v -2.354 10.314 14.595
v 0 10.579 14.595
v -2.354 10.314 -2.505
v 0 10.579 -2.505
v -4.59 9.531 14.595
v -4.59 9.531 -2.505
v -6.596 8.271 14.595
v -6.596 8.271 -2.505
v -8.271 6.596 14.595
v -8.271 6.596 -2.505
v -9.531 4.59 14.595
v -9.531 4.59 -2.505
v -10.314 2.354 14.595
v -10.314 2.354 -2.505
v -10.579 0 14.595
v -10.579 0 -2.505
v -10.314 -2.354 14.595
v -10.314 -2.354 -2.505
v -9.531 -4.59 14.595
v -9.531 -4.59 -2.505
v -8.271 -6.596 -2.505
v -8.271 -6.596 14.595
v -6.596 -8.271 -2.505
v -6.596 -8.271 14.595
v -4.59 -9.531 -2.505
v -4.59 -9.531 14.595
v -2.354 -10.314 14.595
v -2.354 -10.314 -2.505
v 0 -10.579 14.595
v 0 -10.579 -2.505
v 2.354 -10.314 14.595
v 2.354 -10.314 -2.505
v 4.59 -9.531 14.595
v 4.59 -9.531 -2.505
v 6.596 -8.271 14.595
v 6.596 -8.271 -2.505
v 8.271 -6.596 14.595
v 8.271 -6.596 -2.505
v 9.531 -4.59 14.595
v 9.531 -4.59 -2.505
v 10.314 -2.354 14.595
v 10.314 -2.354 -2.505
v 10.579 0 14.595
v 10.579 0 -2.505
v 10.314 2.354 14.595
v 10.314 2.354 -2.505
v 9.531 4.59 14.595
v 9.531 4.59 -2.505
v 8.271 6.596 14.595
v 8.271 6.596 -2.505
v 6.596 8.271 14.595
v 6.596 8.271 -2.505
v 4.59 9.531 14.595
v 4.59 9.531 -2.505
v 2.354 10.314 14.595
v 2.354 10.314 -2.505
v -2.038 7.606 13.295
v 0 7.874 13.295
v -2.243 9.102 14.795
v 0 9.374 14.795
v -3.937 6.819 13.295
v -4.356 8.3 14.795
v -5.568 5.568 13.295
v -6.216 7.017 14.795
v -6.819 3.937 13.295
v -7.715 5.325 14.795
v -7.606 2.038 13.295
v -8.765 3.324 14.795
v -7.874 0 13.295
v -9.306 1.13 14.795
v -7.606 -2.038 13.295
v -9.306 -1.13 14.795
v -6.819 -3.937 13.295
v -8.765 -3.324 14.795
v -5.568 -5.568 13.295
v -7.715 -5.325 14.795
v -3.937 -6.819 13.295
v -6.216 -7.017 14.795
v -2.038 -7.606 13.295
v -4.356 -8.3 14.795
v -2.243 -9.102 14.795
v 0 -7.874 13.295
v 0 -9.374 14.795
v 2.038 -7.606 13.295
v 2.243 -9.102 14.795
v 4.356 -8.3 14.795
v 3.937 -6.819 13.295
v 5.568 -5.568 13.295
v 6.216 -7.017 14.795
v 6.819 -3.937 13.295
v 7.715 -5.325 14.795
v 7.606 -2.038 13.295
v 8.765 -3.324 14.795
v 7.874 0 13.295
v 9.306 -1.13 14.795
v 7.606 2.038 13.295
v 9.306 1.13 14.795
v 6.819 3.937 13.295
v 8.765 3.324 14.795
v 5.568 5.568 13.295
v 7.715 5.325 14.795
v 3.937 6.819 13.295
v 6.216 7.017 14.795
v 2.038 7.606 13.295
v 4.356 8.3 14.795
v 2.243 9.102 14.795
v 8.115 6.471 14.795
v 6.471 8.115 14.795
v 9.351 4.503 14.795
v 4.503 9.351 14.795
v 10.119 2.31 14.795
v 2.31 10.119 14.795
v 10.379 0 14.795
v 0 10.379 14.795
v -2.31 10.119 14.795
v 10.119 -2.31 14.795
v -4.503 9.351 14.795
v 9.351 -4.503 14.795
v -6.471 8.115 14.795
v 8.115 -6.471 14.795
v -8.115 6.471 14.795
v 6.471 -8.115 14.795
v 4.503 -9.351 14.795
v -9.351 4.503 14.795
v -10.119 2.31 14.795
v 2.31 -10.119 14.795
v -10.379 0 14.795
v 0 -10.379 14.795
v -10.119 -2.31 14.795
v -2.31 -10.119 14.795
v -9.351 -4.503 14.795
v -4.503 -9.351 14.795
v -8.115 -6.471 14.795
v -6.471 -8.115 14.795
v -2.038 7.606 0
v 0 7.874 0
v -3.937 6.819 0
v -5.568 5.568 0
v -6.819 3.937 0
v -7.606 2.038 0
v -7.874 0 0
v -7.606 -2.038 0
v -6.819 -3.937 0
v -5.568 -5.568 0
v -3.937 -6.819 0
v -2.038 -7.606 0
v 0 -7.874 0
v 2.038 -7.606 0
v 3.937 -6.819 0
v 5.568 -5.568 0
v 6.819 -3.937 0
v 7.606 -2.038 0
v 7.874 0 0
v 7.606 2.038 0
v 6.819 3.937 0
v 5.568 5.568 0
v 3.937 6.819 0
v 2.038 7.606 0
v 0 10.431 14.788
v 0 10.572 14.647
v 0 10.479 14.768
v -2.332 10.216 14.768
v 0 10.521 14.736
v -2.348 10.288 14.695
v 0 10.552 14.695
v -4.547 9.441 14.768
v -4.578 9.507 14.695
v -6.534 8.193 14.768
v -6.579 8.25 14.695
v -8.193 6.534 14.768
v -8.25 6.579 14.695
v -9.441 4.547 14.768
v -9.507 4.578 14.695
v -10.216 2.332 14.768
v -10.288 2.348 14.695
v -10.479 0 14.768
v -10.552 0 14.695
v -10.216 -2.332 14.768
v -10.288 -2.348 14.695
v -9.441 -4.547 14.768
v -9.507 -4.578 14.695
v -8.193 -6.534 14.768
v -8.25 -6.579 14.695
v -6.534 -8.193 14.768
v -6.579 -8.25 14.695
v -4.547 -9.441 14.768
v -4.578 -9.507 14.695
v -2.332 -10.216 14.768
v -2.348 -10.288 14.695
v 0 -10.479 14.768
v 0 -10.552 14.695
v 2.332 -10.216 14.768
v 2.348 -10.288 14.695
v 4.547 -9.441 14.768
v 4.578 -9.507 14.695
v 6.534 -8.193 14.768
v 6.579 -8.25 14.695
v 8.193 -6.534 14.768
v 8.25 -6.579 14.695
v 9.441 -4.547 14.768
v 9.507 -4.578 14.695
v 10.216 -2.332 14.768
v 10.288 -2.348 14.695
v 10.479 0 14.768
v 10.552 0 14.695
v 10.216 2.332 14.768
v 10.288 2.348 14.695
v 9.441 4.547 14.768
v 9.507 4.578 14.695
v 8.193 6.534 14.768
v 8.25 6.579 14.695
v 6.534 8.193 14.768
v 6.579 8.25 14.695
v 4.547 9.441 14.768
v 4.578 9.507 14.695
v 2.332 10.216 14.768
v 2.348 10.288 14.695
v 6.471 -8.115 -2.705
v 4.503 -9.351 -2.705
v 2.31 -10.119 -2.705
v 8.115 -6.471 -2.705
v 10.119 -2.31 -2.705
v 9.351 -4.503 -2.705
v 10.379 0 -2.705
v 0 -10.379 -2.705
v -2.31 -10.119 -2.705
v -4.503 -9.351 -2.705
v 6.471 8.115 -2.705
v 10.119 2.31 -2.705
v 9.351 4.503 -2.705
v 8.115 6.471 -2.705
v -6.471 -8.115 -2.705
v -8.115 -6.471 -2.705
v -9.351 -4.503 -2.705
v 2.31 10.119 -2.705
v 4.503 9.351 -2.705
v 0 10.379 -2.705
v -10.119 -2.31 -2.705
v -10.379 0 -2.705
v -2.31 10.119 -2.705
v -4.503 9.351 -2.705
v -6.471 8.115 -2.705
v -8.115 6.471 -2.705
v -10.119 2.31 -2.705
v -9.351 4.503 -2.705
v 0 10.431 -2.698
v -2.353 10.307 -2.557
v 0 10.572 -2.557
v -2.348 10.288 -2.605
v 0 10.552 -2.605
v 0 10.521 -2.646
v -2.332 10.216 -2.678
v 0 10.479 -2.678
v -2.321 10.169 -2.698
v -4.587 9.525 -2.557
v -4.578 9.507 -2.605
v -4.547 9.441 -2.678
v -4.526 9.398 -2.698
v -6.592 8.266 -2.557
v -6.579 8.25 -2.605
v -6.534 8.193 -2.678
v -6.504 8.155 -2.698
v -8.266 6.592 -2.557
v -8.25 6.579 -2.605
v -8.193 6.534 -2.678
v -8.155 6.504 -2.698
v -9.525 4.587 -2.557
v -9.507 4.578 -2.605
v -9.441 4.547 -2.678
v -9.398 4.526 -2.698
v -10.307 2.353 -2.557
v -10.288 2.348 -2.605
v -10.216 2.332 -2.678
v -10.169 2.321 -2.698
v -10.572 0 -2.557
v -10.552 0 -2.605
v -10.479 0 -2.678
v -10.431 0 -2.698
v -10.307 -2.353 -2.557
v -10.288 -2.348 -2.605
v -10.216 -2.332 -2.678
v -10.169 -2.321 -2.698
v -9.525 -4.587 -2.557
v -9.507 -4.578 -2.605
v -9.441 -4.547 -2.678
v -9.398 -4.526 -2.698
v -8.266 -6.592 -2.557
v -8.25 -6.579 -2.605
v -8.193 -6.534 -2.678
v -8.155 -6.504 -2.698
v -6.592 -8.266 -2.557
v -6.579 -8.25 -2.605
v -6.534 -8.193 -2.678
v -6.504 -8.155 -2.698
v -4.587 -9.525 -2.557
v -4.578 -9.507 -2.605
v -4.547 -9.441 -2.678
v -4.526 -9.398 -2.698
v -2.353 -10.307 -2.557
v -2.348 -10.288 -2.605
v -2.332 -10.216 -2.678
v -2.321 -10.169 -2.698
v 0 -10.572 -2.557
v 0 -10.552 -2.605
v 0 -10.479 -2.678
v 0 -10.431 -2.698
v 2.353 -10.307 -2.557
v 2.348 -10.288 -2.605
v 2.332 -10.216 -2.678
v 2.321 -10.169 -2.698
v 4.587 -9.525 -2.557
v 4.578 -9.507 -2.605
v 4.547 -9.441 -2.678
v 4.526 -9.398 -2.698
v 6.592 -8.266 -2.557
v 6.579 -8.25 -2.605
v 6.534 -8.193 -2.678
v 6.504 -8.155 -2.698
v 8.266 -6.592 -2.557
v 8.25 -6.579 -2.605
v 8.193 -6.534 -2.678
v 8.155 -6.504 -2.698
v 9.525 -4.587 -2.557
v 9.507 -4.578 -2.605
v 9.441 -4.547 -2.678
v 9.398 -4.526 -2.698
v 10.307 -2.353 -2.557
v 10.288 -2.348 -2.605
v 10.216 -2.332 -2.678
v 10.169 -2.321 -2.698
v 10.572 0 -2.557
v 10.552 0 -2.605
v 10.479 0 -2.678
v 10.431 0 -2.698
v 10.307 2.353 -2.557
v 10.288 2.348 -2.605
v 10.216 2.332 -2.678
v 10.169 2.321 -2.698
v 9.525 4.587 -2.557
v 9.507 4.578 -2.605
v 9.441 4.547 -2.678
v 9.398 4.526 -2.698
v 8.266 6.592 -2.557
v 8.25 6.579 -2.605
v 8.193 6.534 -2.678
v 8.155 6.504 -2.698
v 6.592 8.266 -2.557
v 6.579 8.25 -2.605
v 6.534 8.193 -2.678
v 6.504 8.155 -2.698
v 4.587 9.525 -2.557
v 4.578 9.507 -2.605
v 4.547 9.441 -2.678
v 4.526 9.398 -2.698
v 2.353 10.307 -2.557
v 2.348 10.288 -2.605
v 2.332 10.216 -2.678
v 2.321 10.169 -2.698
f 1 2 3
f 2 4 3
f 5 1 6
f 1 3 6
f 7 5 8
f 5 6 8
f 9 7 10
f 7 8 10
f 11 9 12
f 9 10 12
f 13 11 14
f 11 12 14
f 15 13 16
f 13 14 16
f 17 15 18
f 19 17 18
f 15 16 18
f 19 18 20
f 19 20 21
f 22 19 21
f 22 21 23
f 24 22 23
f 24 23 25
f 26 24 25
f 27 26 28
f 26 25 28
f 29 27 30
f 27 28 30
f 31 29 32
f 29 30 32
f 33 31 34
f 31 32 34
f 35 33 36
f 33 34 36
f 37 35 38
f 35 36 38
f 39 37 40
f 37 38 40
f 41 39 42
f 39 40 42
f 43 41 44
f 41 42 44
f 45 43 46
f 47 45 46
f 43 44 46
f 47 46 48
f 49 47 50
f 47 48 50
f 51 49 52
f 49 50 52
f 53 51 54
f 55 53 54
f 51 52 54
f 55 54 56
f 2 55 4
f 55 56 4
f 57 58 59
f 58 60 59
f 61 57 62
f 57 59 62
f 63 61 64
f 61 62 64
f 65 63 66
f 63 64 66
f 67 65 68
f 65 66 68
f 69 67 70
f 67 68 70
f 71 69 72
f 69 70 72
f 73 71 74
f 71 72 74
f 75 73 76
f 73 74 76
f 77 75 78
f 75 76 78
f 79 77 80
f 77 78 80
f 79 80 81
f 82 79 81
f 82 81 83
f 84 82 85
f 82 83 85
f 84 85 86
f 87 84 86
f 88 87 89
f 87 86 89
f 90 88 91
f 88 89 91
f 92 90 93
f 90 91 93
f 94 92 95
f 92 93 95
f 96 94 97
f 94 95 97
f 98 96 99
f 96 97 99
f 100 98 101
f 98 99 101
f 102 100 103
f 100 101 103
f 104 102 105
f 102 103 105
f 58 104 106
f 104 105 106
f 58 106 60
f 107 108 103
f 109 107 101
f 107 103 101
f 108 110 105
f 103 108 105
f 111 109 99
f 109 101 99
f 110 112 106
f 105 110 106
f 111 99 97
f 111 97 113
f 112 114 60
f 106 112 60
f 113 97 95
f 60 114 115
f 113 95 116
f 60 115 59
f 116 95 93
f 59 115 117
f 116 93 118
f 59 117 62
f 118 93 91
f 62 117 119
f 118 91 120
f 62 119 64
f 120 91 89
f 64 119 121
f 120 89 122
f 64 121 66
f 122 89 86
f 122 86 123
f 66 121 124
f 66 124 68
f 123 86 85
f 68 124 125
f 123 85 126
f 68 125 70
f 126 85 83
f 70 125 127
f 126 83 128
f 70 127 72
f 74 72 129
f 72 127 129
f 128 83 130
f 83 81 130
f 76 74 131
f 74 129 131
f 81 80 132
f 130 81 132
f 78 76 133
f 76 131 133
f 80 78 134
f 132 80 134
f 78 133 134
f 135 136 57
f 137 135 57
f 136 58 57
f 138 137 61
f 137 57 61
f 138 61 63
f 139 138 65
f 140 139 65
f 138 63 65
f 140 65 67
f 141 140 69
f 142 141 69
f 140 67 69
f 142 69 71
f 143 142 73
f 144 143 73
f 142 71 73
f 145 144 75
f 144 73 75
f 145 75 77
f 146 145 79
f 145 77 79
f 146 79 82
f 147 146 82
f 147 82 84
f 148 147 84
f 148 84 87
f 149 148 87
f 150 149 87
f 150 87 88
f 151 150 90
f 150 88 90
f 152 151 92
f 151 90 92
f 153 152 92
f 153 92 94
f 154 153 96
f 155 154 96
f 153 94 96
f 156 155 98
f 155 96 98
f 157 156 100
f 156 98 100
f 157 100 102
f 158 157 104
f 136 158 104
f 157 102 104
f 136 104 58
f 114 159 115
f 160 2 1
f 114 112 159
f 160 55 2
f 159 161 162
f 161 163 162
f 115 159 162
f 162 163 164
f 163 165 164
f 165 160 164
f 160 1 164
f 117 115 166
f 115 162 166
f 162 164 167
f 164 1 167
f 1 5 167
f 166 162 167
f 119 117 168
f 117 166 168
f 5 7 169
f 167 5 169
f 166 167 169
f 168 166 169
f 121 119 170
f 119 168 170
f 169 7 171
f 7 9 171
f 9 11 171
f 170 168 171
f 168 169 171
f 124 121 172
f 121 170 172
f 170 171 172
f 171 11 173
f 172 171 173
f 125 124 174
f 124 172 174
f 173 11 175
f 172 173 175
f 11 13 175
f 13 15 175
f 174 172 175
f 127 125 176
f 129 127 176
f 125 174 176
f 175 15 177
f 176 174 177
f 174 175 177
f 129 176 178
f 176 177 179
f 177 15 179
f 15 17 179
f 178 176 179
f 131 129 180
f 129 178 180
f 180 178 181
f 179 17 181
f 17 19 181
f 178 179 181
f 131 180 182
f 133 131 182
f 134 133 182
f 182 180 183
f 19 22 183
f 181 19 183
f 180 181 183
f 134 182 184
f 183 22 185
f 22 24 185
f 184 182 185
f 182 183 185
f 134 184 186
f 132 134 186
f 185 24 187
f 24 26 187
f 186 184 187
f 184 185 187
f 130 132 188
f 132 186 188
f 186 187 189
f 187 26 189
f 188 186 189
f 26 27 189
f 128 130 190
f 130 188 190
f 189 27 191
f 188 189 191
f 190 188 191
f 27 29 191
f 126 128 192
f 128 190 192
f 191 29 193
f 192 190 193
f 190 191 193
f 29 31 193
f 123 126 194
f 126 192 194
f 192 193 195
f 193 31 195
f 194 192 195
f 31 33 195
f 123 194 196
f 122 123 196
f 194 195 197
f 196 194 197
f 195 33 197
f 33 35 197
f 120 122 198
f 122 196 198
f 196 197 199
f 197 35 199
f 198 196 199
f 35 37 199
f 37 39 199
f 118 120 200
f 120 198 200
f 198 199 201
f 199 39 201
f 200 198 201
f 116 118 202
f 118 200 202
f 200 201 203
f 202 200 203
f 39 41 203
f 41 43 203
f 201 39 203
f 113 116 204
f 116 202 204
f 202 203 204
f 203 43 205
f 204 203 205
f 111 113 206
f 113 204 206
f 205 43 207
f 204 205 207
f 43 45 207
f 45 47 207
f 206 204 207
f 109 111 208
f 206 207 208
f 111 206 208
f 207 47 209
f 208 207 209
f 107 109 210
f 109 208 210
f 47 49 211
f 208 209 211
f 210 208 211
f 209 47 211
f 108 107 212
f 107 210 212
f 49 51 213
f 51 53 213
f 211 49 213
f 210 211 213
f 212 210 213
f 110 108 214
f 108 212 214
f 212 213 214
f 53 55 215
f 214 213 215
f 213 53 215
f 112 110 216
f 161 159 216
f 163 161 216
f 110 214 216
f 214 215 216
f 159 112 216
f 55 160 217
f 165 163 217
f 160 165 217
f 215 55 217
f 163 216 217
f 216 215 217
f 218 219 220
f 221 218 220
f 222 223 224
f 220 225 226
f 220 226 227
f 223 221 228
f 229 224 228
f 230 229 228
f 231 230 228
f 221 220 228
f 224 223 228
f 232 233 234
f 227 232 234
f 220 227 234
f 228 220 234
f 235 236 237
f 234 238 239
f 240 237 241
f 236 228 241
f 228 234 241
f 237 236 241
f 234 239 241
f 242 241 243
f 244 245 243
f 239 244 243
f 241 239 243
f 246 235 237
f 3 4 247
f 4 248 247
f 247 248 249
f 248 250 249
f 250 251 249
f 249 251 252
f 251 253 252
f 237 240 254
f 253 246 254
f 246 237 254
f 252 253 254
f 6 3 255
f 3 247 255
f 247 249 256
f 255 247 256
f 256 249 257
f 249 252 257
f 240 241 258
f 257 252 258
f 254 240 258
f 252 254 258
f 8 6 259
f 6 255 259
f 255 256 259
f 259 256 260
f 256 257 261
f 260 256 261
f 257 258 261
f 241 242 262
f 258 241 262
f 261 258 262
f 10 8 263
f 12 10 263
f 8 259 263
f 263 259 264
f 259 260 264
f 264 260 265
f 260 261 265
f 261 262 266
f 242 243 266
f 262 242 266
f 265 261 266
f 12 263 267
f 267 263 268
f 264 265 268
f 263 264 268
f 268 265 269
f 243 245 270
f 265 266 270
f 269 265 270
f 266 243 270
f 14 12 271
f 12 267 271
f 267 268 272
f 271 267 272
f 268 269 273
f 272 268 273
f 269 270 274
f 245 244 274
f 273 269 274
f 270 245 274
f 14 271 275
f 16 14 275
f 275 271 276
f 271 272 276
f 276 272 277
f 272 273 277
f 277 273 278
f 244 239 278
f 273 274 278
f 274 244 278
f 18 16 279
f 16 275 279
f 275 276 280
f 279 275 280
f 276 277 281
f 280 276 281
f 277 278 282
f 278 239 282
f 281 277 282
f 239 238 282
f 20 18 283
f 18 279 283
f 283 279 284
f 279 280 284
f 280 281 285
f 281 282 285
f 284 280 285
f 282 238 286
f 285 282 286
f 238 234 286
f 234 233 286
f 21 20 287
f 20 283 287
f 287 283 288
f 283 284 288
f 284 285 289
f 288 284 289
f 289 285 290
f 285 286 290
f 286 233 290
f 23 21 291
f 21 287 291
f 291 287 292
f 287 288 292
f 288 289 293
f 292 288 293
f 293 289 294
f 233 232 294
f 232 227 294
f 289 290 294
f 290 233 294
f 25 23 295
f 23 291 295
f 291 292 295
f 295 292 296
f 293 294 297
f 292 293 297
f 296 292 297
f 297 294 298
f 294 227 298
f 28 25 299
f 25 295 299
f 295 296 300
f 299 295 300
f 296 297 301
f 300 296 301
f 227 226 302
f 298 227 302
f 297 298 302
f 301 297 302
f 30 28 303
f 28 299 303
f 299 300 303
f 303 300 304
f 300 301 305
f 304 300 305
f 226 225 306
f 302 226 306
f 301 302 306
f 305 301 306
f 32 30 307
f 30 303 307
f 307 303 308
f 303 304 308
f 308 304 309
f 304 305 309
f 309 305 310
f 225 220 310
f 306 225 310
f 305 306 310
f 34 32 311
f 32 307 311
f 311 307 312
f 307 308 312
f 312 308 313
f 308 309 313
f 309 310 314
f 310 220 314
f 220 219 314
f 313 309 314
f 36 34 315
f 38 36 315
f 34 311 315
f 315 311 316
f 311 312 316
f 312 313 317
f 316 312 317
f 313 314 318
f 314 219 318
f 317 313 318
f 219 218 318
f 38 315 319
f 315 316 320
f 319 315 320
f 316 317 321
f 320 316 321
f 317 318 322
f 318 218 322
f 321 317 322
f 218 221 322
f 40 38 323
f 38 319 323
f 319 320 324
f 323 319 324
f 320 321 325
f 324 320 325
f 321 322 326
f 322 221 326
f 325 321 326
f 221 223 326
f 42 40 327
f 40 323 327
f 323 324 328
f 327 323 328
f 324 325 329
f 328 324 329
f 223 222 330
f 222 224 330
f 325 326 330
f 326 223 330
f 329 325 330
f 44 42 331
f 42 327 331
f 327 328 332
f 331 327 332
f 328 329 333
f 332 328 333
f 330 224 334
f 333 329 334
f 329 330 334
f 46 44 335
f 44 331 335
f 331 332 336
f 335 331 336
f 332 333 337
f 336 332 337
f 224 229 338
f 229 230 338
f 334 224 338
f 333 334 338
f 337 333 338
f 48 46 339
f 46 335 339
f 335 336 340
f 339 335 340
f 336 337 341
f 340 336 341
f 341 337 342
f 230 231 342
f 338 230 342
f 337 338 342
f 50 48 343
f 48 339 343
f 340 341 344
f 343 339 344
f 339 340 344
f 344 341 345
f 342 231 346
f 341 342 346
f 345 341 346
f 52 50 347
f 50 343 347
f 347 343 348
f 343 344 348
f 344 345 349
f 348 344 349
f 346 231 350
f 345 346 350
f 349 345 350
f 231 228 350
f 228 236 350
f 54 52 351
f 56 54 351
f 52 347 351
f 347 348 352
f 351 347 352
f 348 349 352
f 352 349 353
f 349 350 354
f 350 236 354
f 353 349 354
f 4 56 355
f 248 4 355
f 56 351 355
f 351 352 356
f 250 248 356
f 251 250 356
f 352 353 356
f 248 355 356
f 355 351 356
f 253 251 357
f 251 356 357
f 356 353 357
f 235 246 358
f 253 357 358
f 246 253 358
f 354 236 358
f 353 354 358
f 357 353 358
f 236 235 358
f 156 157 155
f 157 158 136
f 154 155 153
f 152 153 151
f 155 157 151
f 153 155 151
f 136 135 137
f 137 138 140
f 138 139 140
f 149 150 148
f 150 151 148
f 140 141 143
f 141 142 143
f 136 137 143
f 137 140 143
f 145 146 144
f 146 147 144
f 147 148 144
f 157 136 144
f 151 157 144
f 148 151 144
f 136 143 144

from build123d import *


with BuildPart() as part:
    # Sketch2 → Revolve1 (revolve)
    with BuildSketch(Plane(origin=(0, 0, 0), x_dir=(0, 0, -1), z_dir=(1, 0, 0))):
        with BuildLine():
            Line((-14.795, 9.374), (-14.795, 10.3791))
            ThreePointArc((-14.795, 10.3791), (-14.736421356, 10.520521356), (-14.595, 10.5791))
            Line((-14.595, 10.5791), (2.505, 10.5791))
            ThreePointArc((2.505, 10.5791), (2.646421356, 10.520521356), (2.705, 10.3791))
            Line((2.705, 10.3791), (2.705, 0))
            Line((2.705, 0), (0, 0))
            Line((0, 0), (0, 7.874))
            Line((0, 7.874), (-13.295, 7.874))
            Line((-13.295, 7.874), (-14.795, 9.374))
        make_face()
    revolve(axis=Axis((0, 0, -2.705), (0, 0, 1)))


solid = part.part
